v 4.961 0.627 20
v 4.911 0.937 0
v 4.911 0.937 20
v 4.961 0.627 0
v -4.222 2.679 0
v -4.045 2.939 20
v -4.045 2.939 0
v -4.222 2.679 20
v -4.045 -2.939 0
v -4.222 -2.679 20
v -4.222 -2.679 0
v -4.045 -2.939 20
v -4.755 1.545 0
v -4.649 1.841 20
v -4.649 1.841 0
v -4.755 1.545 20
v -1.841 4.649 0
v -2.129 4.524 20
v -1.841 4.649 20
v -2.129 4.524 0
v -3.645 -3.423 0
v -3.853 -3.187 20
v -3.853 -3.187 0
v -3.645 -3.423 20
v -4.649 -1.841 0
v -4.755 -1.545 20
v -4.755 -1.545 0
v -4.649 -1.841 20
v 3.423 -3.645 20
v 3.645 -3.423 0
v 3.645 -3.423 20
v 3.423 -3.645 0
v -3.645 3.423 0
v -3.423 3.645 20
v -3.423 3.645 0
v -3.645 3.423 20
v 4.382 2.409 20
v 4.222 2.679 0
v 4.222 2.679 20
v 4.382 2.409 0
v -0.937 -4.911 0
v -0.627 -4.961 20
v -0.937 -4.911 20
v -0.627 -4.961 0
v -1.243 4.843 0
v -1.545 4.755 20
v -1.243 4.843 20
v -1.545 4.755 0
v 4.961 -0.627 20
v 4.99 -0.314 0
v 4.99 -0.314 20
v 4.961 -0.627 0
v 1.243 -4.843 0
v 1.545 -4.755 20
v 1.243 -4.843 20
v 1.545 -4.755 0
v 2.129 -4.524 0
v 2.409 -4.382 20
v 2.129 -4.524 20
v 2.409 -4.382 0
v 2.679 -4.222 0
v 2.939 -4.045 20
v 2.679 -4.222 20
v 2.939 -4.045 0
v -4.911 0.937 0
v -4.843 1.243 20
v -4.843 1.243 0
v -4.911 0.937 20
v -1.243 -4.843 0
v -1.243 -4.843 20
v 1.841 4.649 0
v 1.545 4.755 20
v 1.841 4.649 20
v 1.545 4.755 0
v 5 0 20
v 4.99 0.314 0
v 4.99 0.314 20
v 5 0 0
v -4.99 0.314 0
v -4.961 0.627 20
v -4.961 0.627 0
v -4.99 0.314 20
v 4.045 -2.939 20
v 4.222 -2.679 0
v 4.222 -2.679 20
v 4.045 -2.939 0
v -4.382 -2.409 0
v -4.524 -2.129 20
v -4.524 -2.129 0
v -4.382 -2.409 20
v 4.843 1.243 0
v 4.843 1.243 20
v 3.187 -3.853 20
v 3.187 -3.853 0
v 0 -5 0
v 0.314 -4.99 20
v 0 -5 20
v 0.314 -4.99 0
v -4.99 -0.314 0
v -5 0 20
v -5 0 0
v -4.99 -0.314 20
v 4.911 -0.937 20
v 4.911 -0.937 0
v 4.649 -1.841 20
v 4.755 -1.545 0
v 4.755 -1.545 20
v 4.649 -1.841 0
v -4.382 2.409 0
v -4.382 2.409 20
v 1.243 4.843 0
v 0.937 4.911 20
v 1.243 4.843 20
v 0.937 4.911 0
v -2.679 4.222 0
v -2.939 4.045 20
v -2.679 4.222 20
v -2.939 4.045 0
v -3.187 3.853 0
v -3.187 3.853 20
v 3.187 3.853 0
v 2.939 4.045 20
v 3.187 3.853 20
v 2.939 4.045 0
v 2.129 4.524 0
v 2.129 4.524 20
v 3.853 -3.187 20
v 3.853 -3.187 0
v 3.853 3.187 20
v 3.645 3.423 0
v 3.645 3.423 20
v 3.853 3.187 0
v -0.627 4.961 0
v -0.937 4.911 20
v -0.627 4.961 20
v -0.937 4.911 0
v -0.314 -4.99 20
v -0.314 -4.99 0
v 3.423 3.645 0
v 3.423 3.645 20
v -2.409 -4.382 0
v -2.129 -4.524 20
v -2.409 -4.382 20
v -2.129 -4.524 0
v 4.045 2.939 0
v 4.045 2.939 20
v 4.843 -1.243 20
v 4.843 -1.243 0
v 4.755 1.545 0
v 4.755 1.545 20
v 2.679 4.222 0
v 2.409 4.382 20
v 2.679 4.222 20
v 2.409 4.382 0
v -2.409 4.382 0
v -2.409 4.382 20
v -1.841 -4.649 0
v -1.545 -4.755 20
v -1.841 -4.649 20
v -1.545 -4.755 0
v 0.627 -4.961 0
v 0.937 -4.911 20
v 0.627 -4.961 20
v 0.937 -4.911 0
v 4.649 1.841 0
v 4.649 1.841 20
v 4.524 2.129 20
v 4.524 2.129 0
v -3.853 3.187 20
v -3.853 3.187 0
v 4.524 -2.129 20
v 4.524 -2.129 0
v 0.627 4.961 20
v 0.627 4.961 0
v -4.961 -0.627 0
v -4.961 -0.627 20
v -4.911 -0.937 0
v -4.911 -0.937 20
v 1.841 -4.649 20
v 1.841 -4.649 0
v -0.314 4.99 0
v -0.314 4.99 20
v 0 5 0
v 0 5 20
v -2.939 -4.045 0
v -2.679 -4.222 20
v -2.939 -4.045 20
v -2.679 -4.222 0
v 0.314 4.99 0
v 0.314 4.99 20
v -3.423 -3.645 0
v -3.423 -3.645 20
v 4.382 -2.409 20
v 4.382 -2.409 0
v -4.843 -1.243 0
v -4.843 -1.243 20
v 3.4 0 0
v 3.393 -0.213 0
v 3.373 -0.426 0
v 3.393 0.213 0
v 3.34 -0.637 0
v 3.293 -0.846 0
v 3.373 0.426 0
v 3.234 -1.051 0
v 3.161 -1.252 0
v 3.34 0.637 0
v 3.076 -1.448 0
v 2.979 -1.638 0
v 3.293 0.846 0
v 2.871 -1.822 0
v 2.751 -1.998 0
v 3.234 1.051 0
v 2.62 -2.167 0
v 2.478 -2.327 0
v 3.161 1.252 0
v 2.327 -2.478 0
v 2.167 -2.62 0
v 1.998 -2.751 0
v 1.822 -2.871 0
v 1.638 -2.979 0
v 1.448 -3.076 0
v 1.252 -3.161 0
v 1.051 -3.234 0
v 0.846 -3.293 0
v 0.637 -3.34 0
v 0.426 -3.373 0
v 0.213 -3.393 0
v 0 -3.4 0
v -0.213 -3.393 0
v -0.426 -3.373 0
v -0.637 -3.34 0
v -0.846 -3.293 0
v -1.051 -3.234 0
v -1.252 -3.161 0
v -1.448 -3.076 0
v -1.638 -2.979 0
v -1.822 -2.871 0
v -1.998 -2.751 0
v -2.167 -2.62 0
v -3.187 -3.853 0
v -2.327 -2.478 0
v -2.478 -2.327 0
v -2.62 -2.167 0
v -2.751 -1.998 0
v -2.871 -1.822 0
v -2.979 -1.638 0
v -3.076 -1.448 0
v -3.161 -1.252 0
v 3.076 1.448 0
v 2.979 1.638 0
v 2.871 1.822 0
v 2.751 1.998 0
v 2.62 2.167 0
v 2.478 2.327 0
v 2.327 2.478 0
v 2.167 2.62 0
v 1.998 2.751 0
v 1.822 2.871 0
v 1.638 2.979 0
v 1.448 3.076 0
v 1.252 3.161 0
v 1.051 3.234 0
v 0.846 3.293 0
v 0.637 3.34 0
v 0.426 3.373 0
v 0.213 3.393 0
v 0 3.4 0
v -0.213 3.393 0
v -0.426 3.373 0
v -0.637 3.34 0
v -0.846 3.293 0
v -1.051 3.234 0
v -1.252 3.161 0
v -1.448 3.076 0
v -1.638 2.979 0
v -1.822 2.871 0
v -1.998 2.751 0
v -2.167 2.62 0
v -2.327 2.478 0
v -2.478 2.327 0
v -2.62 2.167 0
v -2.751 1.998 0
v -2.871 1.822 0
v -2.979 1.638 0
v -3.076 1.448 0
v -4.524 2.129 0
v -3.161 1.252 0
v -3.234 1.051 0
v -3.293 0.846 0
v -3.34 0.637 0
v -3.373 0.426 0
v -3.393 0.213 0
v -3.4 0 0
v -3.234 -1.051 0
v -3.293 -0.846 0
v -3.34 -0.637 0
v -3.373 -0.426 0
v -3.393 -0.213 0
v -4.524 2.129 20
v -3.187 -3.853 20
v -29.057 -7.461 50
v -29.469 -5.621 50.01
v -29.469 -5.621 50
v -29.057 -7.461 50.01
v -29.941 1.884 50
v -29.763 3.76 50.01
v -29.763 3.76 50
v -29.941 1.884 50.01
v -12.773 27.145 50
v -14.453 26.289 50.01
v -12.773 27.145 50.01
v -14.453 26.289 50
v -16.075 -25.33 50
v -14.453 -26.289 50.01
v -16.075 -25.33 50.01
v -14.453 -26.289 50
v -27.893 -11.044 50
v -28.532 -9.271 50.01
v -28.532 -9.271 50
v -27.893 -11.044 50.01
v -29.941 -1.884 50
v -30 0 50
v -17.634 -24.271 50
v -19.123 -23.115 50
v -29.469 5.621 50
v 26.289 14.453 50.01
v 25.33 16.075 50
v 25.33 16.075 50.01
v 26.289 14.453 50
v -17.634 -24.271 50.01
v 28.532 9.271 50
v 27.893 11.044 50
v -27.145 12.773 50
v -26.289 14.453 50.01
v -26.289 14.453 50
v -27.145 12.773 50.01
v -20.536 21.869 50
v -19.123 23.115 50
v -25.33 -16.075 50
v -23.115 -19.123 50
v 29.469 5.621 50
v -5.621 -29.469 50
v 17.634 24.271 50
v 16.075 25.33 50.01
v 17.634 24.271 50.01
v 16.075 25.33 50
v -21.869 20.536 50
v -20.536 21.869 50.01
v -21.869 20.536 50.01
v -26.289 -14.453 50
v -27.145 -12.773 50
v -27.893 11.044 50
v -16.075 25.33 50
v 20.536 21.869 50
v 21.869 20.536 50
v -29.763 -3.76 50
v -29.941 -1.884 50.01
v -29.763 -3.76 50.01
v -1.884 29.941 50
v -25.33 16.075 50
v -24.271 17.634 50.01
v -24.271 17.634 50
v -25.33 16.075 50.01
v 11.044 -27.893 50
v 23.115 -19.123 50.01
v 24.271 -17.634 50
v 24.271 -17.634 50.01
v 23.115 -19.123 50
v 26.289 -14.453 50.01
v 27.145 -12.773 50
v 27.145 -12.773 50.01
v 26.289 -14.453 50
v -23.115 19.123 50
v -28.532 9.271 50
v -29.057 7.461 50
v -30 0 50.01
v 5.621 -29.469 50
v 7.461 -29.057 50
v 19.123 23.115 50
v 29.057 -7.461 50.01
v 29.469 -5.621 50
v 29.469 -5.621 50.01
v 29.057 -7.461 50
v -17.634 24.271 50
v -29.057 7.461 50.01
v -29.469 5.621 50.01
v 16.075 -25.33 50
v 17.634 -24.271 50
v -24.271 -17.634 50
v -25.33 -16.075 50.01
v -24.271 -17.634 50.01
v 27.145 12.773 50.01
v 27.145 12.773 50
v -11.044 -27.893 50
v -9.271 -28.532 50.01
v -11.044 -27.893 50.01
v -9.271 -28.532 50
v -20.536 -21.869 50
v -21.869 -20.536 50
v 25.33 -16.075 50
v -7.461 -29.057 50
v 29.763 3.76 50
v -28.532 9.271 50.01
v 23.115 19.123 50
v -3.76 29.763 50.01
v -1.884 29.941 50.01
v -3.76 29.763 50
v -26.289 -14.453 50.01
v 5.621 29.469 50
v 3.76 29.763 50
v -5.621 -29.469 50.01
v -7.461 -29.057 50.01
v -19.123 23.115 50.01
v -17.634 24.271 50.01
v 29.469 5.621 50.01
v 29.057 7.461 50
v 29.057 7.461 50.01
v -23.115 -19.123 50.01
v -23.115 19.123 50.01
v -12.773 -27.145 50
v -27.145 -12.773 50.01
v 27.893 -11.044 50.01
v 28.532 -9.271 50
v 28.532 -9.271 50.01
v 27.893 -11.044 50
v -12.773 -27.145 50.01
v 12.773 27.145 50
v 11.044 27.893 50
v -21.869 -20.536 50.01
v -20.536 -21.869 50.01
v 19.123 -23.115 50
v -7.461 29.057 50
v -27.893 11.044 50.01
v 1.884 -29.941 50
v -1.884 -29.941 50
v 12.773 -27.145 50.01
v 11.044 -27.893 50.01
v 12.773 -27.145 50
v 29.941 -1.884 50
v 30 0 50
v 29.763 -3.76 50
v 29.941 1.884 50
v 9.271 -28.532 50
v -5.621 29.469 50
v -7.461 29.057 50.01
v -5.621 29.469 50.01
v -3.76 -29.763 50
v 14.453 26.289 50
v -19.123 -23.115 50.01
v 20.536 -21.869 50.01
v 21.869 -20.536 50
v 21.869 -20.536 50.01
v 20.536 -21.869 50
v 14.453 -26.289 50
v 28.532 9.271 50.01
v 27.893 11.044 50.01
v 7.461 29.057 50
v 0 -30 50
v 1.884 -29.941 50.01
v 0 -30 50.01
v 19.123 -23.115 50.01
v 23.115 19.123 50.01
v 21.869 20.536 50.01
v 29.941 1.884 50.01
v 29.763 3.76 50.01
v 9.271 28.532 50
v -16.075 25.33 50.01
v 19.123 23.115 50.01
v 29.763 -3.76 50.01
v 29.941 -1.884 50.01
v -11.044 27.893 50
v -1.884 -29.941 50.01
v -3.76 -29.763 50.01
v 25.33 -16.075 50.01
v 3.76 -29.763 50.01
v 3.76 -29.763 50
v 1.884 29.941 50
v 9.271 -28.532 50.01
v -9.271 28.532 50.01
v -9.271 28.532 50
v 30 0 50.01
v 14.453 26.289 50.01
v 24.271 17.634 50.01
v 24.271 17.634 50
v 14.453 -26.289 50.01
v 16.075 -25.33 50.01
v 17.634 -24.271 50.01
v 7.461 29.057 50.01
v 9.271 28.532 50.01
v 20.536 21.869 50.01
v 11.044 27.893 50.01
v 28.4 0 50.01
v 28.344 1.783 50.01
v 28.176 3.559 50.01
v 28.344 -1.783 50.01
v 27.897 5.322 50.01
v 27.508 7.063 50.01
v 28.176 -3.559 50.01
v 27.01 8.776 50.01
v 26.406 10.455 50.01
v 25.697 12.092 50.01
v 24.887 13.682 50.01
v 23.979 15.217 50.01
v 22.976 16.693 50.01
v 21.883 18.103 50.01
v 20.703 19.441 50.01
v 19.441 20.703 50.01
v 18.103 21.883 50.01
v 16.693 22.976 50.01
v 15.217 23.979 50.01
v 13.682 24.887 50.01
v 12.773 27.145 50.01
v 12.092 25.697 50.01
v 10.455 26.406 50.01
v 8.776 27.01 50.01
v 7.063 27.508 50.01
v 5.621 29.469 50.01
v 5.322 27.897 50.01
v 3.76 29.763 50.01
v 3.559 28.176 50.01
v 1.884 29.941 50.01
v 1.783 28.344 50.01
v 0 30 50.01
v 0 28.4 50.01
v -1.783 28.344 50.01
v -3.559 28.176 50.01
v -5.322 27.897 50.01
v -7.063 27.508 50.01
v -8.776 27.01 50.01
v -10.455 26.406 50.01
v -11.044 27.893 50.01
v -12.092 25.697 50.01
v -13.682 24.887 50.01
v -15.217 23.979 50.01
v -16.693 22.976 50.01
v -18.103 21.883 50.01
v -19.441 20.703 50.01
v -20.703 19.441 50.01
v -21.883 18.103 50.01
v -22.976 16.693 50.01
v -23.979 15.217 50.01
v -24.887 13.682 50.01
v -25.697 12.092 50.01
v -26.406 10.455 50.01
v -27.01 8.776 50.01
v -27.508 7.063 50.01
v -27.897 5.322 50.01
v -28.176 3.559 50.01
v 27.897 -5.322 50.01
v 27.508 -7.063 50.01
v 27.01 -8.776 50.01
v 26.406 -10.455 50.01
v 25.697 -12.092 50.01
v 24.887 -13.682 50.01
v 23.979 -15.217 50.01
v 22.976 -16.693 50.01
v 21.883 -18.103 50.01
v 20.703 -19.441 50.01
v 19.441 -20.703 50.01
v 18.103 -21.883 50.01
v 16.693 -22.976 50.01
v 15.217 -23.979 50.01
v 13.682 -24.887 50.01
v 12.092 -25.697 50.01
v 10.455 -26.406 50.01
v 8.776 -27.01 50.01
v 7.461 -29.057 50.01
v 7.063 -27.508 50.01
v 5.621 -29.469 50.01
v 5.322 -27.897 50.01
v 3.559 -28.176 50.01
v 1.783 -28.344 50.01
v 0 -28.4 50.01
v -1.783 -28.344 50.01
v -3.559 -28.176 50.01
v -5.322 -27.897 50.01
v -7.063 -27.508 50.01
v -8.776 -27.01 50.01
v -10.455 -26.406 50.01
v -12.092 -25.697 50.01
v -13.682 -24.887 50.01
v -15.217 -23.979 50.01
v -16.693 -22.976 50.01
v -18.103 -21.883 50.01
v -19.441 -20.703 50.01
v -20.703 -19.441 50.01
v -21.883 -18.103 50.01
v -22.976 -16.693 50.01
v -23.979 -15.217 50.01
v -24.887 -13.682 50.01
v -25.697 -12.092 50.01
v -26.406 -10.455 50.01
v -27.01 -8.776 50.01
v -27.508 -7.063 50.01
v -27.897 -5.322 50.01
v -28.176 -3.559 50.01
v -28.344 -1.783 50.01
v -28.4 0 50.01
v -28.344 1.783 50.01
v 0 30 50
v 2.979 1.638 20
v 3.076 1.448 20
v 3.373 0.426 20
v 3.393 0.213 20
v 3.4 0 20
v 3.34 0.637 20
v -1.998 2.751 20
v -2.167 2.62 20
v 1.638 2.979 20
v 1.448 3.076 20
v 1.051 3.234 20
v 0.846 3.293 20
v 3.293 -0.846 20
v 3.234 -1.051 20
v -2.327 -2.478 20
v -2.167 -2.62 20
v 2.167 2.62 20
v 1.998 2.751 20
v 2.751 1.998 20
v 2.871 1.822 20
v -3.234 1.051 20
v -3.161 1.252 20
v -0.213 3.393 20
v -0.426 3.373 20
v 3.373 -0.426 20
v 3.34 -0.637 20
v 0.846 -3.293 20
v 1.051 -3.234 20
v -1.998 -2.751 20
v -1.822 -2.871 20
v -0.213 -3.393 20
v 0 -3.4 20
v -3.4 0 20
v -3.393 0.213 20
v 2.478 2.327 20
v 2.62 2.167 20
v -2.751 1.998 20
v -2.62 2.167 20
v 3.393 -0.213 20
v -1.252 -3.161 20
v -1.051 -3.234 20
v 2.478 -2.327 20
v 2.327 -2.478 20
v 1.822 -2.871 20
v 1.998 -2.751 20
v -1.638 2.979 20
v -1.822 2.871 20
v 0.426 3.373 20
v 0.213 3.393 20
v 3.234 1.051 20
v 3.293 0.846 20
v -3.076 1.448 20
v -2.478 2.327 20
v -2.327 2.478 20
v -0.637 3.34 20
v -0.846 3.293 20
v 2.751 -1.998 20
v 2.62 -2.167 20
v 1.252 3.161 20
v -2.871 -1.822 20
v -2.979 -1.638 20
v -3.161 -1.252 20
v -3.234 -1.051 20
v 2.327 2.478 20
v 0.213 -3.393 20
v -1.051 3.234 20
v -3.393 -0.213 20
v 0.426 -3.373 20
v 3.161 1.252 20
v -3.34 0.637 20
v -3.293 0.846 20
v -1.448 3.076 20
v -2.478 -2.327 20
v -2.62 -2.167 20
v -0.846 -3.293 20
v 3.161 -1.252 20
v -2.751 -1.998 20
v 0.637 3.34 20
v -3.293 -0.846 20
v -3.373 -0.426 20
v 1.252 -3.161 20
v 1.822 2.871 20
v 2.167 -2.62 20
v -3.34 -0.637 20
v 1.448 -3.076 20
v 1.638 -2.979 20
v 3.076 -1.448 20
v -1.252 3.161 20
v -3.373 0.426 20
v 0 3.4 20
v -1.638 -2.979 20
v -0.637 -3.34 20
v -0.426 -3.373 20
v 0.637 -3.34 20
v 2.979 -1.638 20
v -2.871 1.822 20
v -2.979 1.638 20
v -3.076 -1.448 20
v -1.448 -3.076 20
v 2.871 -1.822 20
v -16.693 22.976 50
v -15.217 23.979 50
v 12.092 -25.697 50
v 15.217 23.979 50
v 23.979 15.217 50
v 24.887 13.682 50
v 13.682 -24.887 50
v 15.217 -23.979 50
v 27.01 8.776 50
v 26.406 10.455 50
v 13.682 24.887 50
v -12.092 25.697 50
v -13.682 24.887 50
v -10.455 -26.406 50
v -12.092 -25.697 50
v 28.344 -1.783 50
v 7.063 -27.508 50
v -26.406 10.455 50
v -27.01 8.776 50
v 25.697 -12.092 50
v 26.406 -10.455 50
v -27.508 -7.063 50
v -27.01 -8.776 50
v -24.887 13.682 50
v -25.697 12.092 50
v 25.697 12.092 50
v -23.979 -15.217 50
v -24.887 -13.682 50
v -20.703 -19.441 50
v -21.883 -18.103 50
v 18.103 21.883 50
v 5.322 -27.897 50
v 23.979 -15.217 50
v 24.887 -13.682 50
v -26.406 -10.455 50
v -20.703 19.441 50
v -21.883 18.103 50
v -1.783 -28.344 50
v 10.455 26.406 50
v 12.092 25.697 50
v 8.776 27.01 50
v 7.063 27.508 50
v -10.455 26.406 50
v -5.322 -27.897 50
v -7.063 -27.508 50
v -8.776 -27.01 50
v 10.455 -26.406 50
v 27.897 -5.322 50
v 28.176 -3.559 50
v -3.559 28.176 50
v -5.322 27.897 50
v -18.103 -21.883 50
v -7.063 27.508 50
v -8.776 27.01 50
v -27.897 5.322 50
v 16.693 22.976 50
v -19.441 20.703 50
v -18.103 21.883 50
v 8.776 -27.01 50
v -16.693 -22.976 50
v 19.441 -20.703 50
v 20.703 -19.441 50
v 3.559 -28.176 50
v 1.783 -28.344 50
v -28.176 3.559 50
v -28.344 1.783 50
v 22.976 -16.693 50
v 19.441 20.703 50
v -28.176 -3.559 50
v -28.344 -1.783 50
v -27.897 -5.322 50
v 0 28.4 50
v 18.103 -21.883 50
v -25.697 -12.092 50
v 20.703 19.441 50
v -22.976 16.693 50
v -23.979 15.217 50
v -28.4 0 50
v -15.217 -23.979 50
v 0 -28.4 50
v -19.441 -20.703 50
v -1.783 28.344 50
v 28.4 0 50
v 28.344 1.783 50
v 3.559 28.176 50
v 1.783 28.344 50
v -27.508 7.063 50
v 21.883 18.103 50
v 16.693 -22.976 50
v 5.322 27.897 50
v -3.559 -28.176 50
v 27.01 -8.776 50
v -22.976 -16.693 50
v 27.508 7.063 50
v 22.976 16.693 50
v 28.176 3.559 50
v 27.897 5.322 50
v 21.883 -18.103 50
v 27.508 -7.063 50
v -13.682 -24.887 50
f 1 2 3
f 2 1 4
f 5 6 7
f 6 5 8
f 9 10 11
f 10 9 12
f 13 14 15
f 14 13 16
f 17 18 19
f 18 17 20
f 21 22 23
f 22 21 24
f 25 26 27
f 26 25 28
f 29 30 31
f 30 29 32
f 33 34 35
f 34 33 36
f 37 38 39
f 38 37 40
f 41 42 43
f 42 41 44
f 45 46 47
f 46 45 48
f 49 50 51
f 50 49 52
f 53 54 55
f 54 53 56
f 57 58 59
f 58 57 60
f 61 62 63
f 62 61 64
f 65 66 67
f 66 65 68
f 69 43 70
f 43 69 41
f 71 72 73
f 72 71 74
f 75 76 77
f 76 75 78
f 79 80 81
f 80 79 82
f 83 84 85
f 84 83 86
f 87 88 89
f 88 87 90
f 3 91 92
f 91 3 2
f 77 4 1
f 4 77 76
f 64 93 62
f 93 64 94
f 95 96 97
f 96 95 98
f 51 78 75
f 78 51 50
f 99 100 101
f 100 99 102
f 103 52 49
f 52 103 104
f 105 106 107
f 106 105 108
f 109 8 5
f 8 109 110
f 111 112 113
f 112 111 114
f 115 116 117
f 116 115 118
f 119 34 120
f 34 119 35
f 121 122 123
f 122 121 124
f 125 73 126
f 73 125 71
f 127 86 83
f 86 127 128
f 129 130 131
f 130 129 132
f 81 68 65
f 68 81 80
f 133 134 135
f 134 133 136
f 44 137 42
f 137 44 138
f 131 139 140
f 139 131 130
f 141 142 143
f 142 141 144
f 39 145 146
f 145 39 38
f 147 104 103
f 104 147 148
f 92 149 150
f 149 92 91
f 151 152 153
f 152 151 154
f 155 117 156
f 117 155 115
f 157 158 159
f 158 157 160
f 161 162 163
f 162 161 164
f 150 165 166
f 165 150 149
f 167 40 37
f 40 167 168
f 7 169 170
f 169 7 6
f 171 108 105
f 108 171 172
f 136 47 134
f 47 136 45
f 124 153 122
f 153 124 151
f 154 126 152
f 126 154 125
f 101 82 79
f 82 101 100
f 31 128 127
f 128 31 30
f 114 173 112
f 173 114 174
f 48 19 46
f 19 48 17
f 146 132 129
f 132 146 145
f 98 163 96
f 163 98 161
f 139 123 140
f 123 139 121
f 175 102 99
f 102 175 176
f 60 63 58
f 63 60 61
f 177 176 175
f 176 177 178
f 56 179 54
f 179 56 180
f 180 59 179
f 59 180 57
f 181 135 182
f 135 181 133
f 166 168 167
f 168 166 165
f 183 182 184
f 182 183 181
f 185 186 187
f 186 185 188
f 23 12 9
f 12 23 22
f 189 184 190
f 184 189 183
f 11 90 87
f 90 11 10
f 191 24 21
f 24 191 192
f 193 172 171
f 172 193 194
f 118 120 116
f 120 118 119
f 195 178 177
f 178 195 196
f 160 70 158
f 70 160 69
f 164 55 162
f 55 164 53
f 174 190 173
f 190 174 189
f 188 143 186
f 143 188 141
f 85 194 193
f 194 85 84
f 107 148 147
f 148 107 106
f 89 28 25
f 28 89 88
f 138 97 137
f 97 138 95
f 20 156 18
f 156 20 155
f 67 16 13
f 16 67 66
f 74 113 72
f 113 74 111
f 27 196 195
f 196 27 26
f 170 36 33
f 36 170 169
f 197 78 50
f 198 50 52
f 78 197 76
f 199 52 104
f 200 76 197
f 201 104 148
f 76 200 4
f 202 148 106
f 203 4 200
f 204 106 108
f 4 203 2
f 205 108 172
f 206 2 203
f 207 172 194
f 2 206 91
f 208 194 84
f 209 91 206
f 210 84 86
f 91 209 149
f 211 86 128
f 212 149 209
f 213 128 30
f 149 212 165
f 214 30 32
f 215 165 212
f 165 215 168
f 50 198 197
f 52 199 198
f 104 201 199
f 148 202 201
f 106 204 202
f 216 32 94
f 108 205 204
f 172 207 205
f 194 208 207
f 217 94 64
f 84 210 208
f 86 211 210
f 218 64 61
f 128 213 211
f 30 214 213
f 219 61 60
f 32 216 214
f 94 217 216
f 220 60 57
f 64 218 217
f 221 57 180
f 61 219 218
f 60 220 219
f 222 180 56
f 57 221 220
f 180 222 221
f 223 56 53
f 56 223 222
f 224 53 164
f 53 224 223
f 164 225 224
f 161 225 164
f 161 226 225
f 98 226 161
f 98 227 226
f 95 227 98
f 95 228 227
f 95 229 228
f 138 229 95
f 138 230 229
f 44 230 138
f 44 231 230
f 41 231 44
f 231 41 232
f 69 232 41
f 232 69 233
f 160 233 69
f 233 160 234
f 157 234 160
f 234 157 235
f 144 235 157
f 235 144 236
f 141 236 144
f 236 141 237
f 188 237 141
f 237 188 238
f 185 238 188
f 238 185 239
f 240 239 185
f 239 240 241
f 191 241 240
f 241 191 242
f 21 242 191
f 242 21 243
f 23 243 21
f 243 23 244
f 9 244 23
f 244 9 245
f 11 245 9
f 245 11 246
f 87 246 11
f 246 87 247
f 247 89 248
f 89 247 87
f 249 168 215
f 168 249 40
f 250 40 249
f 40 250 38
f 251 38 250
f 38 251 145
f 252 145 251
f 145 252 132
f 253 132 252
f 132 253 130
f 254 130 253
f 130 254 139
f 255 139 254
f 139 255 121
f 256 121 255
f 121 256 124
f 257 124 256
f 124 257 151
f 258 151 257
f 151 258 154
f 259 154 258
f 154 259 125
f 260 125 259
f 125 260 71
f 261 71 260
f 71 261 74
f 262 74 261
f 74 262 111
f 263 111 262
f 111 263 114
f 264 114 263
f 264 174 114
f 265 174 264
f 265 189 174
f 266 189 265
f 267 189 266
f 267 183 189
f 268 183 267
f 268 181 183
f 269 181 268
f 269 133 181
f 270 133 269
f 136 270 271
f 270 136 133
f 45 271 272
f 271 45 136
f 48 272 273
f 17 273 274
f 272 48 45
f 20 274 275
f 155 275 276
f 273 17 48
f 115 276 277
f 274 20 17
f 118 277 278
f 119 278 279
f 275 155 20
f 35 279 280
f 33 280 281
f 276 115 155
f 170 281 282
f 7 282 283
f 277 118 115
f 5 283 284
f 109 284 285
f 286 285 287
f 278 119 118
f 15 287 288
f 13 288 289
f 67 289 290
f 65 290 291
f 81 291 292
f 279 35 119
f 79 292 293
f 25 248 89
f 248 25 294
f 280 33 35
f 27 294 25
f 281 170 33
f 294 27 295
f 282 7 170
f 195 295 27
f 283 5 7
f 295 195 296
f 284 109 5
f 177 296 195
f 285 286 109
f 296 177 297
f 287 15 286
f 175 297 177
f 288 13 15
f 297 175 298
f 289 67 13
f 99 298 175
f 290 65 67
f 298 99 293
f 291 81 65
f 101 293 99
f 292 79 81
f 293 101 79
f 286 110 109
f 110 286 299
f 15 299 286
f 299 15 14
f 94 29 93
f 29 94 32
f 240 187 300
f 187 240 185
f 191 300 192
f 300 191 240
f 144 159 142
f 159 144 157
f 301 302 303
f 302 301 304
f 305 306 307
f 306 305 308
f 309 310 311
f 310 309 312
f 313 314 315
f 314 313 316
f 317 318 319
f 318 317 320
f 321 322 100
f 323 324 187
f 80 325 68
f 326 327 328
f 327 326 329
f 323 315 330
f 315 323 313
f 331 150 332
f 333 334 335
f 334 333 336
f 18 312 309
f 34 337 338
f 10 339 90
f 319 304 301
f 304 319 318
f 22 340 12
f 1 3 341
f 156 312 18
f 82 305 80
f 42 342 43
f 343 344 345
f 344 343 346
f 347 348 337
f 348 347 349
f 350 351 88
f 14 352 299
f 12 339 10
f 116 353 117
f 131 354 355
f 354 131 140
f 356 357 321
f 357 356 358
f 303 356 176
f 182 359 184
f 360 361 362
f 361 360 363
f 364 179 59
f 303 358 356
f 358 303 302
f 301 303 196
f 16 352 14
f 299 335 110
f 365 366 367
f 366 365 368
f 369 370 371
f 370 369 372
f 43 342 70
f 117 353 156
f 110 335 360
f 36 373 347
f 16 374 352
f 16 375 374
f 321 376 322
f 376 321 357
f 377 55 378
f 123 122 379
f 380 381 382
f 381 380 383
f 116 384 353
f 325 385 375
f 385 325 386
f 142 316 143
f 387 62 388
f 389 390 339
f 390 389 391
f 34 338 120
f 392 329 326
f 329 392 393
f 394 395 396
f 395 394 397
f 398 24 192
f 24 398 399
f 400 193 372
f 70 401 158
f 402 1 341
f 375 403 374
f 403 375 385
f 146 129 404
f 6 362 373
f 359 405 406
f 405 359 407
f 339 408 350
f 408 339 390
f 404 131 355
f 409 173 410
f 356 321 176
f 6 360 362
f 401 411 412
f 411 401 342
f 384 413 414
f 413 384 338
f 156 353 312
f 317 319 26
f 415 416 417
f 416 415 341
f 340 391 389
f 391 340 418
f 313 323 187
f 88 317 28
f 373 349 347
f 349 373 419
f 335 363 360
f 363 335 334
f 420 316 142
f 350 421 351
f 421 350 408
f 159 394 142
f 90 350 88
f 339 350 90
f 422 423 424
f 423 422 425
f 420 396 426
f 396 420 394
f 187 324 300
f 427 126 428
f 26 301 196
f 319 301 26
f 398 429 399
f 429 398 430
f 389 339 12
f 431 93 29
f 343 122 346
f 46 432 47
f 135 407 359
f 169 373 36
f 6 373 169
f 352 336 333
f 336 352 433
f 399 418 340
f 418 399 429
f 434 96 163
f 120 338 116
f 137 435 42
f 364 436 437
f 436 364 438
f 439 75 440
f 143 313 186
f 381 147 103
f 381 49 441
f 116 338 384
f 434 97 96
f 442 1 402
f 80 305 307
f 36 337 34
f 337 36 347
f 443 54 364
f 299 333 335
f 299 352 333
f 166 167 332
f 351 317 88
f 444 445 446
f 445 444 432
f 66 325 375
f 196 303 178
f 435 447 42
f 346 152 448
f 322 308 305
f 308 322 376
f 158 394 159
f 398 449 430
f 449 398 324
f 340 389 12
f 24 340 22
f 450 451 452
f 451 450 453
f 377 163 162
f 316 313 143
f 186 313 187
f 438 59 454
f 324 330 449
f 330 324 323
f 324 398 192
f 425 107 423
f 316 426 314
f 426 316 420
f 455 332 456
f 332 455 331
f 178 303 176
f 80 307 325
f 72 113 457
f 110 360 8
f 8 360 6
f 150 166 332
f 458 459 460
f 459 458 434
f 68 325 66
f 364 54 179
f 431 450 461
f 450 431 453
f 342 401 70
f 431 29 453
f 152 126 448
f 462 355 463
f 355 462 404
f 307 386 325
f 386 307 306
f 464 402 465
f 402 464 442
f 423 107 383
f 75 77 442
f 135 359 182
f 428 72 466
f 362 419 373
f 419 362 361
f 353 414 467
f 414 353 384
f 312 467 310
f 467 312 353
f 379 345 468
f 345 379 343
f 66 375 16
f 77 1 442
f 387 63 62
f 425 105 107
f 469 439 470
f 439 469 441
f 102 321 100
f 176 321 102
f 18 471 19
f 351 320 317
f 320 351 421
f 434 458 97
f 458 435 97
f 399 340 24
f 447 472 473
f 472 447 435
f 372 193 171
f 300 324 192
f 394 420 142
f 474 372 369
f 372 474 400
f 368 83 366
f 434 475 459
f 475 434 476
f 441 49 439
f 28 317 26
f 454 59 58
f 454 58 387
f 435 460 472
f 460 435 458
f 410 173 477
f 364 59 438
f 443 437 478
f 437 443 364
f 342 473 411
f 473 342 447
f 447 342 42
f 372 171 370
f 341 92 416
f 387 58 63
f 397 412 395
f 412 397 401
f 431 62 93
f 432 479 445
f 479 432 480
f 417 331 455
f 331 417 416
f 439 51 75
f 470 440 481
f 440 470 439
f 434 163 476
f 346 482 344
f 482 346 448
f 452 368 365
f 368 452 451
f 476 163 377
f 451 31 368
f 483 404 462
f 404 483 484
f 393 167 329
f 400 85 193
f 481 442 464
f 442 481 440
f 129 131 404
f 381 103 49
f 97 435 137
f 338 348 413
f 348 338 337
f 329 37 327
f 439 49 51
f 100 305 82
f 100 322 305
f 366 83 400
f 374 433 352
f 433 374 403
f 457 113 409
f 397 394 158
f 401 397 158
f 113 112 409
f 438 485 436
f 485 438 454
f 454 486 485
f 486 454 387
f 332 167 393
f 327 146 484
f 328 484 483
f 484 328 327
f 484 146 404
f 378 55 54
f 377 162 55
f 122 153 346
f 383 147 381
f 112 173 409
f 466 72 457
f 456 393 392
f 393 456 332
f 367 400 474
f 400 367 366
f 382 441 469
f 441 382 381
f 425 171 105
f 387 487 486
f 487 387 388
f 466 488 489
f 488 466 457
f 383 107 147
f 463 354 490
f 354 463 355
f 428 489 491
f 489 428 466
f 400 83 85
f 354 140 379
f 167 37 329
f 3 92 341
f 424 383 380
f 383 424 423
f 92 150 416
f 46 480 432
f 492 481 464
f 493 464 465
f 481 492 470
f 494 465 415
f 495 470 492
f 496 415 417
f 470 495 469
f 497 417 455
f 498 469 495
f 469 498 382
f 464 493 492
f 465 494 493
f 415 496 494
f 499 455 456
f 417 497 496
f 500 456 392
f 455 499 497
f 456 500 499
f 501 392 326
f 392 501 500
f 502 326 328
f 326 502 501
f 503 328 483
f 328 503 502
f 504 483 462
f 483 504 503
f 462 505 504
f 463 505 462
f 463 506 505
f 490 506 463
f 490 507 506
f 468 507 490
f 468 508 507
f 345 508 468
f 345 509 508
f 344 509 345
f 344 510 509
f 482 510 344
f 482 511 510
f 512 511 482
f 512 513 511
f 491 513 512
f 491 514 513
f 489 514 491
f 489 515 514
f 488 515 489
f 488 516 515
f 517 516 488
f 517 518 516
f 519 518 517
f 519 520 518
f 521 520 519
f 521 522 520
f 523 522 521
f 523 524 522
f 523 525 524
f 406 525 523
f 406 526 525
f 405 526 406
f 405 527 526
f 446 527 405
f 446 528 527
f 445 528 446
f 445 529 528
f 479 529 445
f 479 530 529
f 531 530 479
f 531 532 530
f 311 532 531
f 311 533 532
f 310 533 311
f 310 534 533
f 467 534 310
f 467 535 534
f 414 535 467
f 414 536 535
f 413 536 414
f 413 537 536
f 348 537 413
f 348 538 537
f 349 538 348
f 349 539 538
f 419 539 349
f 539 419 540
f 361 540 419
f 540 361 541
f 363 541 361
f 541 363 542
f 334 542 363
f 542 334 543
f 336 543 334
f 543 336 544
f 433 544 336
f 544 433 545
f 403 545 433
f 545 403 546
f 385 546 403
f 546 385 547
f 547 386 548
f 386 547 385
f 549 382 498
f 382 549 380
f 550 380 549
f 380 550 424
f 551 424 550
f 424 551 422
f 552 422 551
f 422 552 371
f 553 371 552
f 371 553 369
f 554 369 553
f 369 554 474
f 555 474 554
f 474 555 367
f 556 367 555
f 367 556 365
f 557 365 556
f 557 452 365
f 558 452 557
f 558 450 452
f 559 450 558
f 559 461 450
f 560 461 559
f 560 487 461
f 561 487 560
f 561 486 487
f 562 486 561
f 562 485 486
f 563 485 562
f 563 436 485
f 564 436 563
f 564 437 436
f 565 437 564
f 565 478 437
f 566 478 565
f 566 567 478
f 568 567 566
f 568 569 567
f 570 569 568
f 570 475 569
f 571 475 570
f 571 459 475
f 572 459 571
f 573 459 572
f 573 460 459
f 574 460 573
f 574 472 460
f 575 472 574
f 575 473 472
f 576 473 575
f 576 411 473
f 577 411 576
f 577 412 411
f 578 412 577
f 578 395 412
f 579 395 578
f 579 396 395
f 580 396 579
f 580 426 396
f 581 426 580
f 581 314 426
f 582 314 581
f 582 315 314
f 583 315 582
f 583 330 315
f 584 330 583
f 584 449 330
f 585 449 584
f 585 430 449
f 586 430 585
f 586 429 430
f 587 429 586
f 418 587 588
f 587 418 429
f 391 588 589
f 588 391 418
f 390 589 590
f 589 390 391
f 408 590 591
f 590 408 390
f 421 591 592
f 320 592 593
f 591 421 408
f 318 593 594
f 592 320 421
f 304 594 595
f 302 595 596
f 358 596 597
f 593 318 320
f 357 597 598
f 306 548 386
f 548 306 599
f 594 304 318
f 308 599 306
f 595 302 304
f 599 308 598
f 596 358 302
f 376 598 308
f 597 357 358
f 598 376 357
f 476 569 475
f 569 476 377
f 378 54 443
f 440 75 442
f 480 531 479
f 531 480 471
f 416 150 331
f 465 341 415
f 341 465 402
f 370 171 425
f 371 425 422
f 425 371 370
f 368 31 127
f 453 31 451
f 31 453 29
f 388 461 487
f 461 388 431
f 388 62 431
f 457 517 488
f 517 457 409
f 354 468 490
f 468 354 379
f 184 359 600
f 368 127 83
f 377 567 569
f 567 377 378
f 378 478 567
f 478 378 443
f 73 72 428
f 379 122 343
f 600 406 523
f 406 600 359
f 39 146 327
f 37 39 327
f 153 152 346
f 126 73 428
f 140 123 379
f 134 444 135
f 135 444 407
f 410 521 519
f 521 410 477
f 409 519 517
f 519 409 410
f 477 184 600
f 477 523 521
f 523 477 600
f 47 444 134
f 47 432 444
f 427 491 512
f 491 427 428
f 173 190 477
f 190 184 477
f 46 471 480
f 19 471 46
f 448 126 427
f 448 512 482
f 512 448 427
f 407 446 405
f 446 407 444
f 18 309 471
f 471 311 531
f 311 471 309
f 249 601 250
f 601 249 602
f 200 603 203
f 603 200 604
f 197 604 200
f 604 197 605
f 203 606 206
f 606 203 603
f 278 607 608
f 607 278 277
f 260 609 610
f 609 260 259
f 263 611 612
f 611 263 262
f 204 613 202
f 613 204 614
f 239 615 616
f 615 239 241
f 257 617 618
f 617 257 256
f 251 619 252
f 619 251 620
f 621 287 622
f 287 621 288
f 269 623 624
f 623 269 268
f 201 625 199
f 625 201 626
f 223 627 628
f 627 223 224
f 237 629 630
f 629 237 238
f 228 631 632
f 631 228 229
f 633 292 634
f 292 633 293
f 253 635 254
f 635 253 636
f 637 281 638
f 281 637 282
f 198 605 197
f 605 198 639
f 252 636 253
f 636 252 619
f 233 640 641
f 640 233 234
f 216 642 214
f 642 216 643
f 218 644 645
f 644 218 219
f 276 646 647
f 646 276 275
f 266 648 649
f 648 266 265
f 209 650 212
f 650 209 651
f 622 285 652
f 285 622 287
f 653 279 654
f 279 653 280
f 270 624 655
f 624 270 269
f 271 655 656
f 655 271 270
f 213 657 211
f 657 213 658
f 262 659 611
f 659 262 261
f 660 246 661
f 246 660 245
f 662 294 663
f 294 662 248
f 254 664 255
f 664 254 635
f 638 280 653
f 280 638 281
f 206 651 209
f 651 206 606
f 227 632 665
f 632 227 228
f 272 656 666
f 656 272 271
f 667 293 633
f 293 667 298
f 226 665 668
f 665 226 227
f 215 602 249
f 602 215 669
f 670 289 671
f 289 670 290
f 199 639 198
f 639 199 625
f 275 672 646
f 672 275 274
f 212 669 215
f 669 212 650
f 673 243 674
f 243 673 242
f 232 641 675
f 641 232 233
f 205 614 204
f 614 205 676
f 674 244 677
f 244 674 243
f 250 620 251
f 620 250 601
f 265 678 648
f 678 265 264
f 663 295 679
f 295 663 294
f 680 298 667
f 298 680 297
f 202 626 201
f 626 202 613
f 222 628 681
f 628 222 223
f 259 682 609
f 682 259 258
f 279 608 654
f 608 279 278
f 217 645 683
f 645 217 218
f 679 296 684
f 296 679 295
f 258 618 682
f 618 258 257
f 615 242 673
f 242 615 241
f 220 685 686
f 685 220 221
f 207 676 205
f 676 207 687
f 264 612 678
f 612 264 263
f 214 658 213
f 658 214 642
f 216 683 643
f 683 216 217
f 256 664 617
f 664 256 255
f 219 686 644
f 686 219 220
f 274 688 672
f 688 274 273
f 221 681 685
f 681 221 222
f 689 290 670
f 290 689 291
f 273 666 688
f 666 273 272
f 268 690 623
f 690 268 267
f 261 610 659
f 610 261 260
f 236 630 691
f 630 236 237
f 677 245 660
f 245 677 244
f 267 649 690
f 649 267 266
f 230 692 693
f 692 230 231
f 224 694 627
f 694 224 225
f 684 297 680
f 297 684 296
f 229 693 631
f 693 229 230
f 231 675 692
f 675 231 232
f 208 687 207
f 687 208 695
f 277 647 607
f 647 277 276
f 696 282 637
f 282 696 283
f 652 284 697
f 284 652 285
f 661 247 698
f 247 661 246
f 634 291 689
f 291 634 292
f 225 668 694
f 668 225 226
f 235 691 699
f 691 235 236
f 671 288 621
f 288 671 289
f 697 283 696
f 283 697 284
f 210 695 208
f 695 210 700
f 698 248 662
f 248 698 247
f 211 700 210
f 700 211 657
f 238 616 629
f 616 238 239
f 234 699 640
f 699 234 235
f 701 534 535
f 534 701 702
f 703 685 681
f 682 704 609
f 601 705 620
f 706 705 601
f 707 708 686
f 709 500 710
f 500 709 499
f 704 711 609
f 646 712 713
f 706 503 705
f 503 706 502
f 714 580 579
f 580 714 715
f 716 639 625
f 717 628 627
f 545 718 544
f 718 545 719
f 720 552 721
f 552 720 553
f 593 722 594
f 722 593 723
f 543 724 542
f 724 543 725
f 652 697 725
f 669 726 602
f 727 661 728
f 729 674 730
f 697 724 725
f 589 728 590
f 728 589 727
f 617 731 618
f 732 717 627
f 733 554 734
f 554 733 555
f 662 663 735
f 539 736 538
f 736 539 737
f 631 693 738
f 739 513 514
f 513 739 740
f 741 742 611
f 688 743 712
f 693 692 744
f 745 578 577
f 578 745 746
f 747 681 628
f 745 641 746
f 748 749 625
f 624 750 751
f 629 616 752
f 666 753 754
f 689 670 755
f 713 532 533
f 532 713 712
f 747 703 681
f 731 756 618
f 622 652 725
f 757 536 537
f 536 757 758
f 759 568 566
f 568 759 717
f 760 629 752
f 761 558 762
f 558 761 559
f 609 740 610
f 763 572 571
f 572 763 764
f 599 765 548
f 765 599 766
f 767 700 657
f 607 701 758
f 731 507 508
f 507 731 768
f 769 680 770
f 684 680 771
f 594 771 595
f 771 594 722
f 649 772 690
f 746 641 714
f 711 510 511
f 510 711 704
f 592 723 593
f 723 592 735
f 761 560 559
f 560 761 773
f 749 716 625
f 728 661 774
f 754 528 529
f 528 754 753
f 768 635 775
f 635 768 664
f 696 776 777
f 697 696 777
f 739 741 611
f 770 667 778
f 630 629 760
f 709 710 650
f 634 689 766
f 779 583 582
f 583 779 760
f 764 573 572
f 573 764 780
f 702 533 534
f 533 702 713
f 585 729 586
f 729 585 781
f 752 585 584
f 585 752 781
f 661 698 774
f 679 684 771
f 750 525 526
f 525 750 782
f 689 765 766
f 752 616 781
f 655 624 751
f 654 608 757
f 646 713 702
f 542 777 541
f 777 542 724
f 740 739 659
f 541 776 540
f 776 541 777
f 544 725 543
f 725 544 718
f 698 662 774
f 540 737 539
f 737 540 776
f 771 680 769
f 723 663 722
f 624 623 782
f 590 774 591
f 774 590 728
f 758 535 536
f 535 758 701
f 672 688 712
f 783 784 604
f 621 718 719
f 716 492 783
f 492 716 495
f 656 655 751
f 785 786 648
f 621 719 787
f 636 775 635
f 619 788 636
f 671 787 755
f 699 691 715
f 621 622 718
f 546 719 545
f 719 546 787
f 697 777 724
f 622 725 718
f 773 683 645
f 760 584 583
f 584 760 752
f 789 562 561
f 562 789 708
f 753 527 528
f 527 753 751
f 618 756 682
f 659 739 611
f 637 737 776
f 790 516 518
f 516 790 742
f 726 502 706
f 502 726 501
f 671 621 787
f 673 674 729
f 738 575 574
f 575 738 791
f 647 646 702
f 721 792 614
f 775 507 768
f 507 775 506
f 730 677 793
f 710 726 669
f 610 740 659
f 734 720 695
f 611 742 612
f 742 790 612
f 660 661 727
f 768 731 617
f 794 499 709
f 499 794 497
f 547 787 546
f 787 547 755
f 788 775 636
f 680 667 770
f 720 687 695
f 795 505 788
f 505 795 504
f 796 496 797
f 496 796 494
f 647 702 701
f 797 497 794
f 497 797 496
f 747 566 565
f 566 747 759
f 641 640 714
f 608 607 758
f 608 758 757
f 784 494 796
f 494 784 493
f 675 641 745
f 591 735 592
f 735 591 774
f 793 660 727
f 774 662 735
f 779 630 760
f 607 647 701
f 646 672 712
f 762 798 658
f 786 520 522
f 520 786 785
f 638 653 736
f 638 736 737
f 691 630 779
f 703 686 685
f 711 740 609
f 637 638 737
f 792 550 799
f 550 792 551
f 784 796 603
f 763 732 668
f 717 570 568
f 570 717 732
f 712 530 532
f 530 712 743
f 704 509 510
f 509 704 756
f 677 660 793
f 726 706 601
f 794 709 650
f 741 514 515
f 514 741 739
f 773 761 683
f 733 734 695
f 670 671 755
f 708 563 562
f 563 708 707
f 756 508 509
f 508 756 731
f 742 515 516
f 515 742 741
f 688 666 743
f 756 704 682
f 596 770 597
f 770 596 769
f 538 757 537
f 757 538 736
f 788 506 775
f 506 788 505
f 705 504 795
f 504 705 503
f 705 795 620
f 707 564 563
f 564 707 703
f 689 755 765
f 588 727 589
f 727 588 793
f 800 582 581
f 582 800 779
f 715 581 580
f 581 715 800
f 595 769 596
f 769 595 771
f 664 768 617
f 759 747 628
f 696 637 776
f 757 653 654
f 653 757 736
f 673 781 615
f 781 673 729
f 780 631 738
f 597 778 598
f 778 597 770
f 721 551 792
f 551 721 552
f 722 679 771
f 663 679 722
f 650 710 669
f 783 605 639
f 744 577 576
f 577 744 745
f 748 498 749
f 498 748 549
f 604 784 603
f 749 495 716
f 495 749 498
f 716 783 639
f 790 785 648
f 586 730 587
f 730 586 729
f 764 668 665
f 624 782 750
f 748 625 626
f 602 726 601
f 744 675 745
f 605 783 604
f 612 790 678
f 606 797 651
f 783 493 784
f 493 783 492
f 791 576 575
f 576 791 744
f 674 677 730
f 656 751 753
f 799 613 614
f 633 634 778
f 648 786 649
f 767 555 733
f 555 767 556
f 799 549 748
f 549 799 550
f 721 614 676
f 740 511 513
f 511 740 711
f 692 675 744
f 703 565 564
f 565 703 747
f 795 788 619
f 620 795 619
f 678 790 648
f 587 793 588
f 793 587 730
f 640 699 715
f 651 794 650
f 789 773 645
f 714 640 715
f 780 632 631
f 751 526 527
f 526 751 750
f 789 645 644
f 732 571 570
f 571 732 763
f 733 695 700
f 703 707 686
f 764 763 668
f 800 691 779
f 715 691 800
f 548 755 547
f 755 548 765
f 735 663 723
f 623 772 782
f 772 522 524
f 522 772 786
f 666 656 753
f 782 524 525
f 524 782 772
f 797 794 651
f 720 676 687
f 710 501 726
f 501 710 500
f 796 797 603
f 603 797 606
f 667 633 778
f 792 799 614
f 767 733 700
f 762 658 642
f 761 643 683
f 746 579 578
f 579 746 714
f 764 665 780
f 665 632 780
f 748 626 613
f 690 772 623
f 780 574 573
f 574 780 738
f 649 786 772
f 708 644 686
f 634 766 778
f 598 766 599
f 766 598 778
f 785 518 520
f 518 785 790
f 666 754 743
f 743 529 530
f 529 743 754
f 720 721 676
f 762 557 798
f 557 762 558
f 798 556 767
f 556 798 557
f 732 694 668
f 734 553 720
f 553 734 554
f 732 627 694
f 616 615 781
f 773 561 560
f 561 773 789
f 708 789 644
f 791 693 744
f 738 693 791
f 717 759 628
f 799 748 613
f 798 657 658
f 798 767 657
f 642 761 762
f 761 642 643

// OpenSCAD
// Small Lab Funnel
// Designed for FDM printing, printed upright.

// Dimensions
spout_od      = 10.0;    // Outer diameter of the spout (mm)
spout_height  = 20.0;    // Height of the spout (mm)
funnel_top_od = 60.0;    // Outer diameter at the top rim (mm)
funnel_height = 50.0;    // Total height from base to rim (mm)
wall_thickness = 1.6;    // Wall thickness (mm)

$fn = 100;               // High resolution for smooth curves

// Calculated internal dimensions
spout_id = spout_od - (2 * wall_thickness);
funnel_id_base = spout_od - (2 * wall_thickness);
funnel_id_top  = funnel_top_od - (2 * wall_thickness);

// The height of the conical section is the total height minus the spout height
cone_section_height = funnel_height - spout_height;

module funnel_body() {
    union() {
        // 1. The Spout (Cylinder)
        cylinder(h = spout_height, d = spout_od);
        
        // 2. The Funnel Cone
        // We use a hull of two circles to create the conical frustum
        hull() {
            // Bottom of cone (at z = 20)
            translate([0, 0, spout_height]) 
                cylinder(h = 0.01, d = spout_od);
            
            // Top of cone (at z = 50)
            translate([0, 0, funnel_height]) 
                cylinder(h = 0.01, d = funnel_top_od);
        }
    }
}

difference() {
    // Main solid body
    funnel_body();
    
    // Subtract the internal cavity to create the hollow funnel
    union() {
        // Internal spout bore
        translate([0, 0, -1]) 
            cylinder(h = spout_height + 2, d = spout_id);
        
        // Internal conical bore
        hull() {
            // Bottom of internal cone (at z = 20)
            translate([0, 0, spout_height]) 
                cylinder(h = 0.01, d = spout_id);
            
            // Top of internal cone (at z = 50)
            translate([0, 0, funnel_height]) 
                cylinder(h = 0.01, d = funnel_id_top);
        }
    }
}
